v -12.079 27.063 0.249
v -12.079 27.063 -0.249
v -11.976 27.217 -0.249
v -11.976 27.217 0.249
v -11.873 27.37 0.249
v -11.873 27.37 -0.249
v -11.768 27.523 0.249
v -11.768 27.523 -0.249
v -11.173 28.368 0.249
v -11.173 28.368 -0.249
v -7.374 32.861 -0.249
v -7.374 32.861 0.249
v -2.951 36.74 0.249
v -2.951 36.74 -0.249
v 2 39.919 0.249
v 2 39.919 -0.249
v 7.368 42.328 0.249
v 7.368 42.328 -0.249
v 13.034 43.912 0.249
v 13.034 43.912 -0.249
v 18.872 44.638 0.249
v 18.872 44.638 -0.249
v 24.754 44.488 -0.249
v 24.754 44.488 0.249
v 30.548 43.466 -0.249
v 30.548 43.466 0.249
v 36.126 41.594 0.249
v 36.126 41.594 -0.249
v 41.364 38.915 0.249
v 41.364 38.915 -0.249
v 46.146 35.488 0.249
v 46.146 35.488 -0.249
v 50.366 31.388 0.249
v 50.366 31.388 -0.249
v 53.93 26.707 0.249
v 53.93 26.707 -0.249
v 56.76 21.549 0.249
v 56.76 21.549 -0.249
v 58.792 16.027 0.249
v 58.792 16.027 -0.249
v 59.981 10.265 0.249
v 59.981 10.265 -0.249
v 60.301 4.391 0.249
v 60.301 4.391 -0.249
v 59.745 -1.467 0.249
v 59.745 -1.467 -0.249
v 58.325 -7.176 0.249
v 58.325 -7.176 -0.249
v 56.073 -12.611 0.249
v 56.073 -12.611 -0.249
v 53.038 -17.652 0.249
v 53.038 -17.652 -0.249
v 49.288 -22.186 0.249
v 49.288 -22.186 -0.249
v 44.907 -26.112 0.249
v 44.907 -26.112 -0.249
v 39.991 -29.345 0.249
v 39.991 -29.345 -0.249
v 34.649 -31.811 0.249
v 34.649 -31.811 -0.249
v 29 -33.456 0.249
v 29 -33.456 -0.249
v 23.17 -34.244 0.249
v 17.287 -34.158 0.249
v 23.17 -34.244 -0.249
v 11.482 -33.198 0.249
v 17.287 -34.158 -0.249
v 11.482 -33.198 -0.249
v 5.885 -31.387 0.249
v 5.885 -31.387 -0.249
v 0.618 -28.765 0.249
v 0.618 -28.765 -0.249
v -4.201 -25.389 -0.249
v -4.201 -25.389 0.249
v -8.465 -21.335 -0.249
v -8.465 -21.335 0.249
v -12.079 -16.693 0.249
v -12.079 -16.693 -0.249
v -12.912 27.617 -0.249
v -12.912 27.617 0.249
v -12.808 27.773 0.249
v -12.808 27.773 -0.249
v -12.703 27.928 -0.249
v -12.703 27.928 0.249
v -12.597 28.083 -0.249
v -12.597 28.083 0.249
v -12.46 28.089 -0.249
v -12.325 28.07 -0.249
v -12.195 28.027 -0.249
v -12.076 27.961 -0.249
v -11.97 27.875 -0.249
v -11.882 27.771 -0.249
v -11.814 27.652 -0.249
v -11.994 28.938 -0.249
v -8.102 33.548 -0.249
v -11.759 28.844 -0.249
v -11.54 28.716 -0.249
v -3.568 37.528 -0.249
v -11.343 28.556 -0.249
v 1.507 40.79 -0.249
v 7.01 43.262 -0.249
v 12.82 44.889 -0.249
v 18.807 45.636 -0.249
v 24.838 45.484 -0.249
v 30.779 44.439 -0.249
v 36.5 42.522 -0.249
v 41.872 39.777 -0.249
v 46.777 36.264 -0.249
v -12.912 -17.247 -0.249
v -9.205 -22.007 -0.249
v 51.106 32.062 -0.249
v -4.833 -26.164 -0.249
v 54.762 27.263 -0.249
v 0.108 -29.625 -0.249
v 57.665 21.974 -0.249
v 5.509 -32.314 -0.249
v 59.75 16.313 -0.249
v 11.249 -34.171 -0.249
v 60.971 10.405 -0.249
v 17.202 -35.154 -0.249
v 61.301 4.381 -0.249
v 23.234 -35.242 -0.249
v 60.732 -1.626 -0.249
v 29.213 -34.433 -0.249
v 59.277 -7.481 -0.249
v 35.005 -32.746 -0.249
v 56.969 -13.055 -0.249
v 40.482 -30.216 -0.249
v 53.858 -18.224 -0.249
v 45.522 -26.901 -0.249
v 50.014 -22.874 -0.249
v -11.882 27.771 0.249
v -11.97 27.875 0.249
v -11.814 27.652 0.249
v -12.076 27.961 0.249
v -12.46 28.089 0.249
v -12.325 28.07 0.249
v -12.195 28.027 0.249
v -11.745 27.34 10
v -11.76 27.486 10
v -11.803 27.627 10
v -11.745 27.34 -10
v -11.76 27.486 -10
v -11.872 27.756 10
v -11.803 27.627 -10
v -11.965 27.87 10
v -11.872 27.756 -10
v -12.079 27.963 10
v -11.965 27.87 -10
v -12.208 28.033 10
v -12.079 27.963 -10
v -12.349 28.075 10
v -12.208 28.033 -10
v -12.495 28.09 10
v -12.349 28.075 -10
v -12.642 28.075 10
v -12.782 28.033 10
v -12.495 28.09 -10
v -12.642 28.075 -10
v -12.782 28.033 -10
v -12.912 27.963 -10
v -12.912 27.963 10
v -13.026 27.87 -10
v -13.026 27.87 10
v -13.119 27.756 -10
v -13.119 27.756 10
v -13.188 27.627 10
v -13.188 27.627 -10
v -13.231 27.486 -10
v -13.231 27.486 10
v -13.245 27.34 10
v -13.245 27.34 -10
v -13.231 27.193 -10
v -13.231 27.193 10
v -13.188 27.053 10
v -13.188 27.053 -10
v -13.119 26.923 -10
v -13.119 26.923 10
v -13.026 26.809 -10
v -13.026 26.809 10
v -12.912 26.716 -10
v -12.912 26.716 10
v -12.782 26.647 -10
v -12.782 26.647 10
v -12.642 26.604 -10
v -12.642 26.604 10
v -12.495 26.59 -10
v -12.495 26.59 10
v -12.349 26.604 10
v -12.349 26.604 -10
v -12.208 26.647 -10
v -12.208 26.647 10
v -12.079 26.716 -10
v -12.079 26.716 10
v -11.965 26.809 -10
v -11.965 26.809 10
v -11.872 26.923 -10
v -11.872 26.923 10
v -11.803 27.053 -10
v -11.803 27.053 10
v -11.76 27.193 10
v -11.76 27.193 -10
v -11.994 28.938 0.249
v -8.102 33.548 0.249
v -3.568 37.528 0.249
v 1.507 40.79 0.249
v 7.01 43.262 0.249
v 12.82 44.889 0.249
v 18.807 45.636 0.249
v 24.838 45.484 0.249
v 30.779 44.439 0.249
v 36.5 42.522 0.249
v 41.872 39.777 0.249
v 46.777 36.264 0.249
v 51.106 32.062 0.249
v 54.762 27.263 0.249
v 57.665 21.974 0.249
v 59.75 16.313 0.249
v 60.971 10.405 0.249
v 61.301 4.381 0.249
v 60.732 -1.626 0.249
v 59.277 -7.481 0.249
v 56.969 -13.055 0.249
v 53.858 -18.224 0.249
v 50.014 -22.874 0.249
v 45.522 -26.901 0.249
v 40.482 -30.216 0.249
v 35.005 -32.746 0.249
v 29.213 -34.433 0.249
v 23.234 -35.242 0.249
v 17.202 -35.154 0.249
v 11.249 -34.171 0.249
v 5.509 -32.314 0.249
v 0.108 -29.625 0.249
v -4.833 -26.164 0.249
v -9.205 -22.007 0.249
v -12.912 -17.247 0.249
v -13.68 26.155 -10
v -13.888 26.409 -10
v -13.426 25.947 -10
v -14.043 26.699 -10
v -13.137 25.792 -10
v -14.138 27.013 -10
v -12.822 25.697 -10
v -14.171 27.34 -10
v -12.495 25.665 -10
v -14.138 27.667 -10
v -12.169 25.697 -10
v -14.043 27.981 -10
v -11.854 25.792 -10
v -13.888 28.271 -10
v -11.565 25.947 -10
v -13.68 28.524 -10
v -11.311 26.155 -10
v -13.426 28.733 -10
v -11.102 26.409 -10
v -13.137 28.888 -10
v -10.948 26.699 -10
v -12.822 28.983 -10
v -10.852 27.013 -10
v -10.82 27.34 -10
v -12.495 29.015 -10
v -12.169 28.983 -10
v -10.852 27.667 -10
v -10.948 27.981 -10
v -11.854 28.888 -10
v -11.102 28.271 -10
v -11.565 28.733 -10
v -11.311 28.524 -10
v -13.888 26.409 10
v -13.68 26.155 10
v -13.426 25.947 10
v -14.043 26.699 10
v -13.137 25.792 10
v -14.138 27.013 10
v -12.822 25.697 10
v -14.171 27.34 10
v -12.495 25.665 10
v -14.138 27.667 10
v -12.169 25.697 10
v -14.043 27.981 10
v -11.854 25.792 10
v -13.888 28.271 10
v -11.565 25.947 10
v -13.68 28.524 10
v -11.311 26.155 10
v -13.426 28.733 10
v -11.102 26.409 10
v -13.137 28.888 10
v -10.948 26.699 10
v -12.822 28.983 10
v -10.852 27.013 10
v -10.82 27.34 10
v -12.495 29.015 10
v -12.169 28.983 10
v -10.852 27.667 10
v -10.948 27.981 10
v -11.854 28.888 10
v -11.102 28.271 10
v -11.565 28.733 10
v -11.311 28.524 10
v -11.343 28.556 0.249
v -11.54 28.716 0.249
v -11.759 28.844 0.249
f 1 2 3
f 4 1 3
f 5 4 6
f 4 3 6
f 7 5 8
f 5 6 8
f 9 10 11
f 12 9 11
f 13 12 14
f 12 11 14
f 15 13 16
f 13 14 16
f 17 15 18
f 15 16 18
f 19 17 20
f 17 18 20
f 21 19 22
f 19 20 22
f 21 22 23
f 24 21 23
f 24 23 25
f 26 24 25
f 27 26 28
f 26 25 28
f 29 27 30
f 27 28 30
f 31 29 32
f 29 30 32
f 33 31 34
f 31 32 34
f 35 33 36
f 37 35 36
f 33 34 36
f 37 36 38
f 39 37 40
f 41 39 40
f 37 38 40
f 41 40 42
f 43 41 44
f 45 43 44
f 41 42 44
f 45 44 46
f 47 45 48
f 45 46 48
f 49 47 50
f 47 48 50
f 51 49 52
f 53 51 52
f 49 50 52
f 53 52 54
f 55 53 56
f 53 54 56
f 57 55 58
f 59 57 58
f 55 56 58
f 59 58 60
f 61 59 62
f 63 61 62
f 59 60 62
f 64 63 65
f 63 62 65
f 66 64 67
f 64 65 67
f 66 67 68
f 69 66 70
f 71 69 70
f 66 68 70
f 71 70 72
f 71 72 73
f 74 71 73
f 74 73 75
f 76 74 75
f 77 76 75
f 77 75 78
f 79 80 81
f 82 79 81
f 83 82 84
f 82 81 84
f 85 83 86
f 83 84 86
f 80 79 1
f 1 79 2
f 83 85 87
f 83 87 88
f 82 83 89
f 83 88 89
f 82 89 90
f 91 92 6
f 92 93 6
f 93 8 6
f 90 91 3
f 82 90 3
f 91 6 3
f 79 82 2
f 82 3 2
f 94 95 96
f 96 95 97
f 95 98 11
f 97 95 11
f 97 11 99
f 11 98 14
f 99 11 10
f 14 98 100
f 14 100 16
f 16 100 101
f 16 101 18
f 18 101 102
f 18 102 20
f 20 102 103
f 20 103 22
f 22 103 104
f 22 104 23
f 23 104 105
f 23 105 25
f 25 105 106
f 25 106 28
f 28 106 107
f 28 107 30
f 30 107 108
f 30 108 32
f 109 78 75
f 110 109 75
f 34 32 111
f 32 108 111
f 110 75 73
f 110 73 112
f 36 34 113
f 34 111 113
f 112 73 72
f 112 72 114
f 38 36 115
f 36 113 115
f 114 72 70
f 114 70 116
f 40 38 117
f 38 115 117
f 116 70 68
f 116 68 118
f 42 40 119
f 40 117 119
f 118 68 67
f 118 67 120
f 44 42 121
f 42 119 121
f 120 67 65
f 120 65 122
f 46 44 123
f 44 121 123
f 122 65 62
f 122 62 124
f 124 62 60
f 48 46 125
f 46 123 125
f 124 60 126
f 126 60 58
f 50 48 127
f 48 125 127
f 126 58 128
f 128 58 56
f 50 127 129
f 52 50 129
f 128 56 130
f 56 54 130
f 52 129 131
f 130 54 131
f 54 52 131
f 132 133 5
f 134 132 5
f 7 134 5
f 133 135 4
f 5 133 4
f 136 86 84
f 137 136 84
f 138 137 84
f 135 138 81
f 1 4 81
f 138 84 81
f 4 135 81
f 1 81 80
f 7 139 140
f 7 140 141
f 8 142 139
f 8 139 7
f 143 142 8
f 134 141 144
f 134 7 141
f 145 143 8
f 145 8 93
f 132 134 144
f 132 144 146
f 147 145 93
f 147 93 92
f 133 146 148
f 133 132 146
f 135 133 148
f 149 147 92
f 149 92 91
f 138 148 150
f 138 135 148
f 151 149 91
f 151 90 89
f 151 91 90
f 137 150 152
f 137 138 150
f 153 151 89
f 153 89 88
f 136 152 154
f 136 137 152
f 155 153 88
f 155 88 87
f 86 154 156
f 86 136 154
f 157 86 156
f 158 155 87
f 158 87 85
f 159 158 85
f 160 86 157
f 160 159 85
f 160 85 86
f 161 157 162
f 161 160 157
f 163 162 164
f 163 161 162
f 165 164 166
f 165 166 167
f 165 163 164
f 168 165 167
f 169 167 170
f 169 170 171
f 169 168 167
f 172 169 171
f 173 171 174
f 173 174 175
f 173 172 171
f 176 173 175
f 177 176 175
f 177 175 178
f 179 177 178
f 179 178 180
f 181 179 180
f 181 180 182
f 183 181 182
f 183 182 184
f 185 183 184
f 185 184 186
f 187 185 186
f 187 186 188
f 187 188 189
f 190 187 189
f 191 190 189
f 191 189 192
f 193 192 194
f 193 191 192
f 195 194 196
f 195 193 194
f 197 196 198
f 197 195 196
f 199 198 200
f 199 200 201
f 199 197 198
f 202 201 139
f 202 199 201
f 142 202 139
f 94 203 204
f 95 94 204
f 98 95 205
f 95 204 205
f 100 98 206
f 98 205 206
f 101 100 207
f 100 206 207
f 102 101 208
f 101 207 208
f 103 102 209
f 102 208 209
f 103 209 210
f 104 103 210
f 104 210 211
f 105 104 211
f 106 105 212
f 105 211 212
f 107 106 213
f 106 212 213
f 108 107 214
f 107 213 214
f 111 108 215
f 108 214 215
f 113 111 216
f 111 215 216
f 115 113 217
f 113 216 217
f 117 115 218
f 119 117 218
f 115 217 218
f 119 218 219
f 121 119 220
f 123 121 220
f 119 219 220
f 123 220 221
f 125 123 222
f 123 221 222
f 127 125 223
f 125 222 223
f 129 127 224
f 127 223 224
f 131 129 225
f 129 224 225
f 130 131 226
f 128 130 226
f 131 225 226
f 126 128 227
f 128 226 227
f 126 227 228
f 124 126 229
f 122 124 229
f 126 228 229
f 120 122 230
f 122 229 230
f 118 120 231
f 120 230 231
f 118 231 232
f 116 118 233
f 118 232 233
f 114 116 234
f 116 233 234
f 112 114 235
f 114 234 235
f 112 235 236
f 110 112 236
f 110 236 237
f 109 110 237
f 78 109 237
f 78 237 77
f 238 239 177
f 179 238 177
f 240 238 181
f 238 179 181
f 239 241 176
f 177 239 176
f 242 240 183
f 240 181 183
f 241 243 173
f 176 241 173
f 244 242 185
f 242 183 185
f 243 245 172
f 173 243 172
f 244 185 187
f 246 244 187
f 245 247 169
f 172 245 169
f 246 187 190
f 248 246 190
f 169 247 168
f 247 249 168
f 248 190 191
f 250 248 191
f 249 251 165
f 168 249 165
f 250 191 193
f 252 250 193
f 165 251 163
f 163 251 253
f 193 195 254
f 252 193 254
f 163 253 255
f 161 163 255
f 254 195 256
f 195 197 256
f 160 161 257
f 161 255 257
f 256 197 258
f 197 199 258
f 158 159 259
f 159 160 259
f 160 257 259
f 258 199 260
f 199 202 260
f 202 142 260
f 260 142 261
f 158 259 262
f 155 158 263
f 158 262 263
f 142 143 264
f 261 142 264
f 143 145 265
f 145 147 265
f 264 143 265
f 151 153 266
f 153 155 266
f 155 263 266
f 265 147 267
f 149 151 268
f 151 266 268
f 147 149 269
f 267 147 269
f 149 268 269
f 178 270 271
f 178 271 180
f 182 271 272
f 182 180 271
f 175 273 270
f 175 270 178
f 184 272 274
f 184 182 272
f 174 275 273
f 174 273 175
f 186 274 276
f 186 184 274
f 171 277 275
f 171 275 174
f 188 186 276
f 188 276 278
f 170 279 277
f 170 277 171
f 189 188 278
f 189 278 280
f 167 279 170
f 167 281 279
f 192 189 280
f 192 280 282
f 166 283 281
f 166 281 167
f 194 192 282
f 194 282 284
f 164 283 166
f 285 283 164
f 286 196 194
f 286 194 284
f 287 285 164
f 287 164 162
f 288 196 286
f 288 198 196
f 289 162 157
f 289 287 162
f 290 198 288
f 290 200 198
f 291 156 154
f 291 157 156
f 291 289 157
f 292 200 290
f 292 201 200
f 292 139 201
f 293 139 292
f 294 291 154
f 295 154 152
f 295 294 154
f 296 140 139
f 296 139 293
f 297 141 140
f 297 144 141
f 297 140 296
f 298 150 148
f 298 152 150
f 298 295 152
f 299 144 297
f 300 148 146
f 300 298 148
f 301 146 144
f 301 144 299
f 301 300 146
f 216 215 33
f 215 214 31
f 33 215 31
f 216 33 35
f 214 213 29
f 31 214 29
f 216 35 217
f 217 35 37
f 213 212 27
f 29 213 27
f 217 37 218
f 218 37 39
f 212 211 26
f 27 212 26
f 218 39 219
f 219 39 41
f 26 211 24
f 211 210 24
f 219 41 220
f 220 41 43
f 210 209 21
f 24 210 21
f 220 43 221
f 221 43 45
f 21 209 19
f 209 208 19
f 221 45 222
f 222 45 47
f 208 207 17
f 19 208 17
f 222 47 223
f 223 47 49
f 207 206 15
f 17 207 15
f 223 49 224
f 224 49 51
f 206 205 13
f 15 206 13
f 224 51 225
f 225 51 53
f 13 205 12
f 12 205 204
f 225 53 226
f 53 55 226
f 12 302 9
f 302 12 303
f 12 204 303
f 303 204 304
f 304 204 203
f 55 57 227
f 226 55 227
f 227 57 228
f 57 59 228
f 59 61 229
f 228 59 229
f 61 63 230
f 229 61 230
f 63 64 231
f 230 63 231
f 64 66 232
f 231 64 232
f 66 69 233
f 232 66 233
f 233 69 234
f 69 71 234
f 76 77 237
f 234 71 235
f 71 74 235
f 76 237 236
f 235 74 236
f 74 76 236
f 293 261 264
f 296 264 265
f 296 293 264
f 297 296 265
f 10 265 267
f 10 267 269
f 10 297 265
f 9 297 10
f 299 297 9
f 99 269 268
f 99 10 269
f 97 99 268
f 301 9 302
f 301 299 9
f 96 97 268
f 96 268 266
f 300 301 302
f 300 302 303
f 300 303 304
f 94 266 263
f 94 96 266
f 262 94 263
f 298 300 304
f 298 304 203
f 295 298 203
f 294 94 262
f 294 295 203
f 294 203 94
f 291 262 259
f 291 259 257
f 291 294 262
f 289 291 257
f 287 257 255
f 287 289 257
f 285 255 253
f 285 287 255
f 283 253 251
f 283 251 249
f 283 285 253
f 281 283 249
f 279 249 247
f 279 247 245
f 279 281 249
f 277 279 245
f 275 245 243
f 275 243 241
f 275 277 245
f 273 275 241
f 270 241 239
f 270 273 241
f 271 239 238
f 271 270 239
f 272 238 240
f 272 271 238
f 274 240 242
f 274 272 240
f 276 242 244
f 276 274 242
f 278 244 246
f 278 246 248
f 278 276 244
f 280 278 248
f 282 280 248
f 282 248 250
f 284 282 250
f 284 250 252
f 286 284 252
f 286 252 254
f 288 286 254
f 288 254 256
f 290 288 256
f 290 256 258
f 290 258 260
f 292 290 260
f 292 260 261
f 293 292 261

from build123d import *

# Parameters (mm, degrees)
SKETCH1_R           = 1.675263483
SKETCH1_R_2         = 0.75
BOSS_EXTRUDE1_DEPTH = 10
SKETCH3_W           = 0.497124842
SKETCH3_H           = 1


with BuildPart() as part:
    # Sketch1 → Boss-Extrude1 (new body, symmetric)
    with BuildSketch(Plane.XY):
        with Locations((-12.495417101, 27.339793711)):
            Circle(SKETCH1_R)
        with Locations((-12.495417101, 27.339793711)):
            Circle(SKETCH1_R_2, mode=Mode.SUBTRACT)
    extrude(amount=BOSS_EXTRUDE1_DEPTH, both=True)

    # Sweep1: sweep along a path in Sketch2
    with BuildLine(Plane.XY) as sweep1_path:
        ThreePointArc((-12.495417101, 27.339793711), (60.808757123, 5.185065564), (-12.495417101, -16.969662583))
    # Sketch3 → Sweep1 (sweep)
    with BuildSketch(Plane(origin=(-12.495417101, 27.339793711, 0), x_dir=(0, 0, 1), z_dir=(0.553868204, 0.832604356, 0))):
        Rectangle(SKETCH3_W, SKETCH3_H)
    sweep(path=sweep1_path.line)


solid = part.part
